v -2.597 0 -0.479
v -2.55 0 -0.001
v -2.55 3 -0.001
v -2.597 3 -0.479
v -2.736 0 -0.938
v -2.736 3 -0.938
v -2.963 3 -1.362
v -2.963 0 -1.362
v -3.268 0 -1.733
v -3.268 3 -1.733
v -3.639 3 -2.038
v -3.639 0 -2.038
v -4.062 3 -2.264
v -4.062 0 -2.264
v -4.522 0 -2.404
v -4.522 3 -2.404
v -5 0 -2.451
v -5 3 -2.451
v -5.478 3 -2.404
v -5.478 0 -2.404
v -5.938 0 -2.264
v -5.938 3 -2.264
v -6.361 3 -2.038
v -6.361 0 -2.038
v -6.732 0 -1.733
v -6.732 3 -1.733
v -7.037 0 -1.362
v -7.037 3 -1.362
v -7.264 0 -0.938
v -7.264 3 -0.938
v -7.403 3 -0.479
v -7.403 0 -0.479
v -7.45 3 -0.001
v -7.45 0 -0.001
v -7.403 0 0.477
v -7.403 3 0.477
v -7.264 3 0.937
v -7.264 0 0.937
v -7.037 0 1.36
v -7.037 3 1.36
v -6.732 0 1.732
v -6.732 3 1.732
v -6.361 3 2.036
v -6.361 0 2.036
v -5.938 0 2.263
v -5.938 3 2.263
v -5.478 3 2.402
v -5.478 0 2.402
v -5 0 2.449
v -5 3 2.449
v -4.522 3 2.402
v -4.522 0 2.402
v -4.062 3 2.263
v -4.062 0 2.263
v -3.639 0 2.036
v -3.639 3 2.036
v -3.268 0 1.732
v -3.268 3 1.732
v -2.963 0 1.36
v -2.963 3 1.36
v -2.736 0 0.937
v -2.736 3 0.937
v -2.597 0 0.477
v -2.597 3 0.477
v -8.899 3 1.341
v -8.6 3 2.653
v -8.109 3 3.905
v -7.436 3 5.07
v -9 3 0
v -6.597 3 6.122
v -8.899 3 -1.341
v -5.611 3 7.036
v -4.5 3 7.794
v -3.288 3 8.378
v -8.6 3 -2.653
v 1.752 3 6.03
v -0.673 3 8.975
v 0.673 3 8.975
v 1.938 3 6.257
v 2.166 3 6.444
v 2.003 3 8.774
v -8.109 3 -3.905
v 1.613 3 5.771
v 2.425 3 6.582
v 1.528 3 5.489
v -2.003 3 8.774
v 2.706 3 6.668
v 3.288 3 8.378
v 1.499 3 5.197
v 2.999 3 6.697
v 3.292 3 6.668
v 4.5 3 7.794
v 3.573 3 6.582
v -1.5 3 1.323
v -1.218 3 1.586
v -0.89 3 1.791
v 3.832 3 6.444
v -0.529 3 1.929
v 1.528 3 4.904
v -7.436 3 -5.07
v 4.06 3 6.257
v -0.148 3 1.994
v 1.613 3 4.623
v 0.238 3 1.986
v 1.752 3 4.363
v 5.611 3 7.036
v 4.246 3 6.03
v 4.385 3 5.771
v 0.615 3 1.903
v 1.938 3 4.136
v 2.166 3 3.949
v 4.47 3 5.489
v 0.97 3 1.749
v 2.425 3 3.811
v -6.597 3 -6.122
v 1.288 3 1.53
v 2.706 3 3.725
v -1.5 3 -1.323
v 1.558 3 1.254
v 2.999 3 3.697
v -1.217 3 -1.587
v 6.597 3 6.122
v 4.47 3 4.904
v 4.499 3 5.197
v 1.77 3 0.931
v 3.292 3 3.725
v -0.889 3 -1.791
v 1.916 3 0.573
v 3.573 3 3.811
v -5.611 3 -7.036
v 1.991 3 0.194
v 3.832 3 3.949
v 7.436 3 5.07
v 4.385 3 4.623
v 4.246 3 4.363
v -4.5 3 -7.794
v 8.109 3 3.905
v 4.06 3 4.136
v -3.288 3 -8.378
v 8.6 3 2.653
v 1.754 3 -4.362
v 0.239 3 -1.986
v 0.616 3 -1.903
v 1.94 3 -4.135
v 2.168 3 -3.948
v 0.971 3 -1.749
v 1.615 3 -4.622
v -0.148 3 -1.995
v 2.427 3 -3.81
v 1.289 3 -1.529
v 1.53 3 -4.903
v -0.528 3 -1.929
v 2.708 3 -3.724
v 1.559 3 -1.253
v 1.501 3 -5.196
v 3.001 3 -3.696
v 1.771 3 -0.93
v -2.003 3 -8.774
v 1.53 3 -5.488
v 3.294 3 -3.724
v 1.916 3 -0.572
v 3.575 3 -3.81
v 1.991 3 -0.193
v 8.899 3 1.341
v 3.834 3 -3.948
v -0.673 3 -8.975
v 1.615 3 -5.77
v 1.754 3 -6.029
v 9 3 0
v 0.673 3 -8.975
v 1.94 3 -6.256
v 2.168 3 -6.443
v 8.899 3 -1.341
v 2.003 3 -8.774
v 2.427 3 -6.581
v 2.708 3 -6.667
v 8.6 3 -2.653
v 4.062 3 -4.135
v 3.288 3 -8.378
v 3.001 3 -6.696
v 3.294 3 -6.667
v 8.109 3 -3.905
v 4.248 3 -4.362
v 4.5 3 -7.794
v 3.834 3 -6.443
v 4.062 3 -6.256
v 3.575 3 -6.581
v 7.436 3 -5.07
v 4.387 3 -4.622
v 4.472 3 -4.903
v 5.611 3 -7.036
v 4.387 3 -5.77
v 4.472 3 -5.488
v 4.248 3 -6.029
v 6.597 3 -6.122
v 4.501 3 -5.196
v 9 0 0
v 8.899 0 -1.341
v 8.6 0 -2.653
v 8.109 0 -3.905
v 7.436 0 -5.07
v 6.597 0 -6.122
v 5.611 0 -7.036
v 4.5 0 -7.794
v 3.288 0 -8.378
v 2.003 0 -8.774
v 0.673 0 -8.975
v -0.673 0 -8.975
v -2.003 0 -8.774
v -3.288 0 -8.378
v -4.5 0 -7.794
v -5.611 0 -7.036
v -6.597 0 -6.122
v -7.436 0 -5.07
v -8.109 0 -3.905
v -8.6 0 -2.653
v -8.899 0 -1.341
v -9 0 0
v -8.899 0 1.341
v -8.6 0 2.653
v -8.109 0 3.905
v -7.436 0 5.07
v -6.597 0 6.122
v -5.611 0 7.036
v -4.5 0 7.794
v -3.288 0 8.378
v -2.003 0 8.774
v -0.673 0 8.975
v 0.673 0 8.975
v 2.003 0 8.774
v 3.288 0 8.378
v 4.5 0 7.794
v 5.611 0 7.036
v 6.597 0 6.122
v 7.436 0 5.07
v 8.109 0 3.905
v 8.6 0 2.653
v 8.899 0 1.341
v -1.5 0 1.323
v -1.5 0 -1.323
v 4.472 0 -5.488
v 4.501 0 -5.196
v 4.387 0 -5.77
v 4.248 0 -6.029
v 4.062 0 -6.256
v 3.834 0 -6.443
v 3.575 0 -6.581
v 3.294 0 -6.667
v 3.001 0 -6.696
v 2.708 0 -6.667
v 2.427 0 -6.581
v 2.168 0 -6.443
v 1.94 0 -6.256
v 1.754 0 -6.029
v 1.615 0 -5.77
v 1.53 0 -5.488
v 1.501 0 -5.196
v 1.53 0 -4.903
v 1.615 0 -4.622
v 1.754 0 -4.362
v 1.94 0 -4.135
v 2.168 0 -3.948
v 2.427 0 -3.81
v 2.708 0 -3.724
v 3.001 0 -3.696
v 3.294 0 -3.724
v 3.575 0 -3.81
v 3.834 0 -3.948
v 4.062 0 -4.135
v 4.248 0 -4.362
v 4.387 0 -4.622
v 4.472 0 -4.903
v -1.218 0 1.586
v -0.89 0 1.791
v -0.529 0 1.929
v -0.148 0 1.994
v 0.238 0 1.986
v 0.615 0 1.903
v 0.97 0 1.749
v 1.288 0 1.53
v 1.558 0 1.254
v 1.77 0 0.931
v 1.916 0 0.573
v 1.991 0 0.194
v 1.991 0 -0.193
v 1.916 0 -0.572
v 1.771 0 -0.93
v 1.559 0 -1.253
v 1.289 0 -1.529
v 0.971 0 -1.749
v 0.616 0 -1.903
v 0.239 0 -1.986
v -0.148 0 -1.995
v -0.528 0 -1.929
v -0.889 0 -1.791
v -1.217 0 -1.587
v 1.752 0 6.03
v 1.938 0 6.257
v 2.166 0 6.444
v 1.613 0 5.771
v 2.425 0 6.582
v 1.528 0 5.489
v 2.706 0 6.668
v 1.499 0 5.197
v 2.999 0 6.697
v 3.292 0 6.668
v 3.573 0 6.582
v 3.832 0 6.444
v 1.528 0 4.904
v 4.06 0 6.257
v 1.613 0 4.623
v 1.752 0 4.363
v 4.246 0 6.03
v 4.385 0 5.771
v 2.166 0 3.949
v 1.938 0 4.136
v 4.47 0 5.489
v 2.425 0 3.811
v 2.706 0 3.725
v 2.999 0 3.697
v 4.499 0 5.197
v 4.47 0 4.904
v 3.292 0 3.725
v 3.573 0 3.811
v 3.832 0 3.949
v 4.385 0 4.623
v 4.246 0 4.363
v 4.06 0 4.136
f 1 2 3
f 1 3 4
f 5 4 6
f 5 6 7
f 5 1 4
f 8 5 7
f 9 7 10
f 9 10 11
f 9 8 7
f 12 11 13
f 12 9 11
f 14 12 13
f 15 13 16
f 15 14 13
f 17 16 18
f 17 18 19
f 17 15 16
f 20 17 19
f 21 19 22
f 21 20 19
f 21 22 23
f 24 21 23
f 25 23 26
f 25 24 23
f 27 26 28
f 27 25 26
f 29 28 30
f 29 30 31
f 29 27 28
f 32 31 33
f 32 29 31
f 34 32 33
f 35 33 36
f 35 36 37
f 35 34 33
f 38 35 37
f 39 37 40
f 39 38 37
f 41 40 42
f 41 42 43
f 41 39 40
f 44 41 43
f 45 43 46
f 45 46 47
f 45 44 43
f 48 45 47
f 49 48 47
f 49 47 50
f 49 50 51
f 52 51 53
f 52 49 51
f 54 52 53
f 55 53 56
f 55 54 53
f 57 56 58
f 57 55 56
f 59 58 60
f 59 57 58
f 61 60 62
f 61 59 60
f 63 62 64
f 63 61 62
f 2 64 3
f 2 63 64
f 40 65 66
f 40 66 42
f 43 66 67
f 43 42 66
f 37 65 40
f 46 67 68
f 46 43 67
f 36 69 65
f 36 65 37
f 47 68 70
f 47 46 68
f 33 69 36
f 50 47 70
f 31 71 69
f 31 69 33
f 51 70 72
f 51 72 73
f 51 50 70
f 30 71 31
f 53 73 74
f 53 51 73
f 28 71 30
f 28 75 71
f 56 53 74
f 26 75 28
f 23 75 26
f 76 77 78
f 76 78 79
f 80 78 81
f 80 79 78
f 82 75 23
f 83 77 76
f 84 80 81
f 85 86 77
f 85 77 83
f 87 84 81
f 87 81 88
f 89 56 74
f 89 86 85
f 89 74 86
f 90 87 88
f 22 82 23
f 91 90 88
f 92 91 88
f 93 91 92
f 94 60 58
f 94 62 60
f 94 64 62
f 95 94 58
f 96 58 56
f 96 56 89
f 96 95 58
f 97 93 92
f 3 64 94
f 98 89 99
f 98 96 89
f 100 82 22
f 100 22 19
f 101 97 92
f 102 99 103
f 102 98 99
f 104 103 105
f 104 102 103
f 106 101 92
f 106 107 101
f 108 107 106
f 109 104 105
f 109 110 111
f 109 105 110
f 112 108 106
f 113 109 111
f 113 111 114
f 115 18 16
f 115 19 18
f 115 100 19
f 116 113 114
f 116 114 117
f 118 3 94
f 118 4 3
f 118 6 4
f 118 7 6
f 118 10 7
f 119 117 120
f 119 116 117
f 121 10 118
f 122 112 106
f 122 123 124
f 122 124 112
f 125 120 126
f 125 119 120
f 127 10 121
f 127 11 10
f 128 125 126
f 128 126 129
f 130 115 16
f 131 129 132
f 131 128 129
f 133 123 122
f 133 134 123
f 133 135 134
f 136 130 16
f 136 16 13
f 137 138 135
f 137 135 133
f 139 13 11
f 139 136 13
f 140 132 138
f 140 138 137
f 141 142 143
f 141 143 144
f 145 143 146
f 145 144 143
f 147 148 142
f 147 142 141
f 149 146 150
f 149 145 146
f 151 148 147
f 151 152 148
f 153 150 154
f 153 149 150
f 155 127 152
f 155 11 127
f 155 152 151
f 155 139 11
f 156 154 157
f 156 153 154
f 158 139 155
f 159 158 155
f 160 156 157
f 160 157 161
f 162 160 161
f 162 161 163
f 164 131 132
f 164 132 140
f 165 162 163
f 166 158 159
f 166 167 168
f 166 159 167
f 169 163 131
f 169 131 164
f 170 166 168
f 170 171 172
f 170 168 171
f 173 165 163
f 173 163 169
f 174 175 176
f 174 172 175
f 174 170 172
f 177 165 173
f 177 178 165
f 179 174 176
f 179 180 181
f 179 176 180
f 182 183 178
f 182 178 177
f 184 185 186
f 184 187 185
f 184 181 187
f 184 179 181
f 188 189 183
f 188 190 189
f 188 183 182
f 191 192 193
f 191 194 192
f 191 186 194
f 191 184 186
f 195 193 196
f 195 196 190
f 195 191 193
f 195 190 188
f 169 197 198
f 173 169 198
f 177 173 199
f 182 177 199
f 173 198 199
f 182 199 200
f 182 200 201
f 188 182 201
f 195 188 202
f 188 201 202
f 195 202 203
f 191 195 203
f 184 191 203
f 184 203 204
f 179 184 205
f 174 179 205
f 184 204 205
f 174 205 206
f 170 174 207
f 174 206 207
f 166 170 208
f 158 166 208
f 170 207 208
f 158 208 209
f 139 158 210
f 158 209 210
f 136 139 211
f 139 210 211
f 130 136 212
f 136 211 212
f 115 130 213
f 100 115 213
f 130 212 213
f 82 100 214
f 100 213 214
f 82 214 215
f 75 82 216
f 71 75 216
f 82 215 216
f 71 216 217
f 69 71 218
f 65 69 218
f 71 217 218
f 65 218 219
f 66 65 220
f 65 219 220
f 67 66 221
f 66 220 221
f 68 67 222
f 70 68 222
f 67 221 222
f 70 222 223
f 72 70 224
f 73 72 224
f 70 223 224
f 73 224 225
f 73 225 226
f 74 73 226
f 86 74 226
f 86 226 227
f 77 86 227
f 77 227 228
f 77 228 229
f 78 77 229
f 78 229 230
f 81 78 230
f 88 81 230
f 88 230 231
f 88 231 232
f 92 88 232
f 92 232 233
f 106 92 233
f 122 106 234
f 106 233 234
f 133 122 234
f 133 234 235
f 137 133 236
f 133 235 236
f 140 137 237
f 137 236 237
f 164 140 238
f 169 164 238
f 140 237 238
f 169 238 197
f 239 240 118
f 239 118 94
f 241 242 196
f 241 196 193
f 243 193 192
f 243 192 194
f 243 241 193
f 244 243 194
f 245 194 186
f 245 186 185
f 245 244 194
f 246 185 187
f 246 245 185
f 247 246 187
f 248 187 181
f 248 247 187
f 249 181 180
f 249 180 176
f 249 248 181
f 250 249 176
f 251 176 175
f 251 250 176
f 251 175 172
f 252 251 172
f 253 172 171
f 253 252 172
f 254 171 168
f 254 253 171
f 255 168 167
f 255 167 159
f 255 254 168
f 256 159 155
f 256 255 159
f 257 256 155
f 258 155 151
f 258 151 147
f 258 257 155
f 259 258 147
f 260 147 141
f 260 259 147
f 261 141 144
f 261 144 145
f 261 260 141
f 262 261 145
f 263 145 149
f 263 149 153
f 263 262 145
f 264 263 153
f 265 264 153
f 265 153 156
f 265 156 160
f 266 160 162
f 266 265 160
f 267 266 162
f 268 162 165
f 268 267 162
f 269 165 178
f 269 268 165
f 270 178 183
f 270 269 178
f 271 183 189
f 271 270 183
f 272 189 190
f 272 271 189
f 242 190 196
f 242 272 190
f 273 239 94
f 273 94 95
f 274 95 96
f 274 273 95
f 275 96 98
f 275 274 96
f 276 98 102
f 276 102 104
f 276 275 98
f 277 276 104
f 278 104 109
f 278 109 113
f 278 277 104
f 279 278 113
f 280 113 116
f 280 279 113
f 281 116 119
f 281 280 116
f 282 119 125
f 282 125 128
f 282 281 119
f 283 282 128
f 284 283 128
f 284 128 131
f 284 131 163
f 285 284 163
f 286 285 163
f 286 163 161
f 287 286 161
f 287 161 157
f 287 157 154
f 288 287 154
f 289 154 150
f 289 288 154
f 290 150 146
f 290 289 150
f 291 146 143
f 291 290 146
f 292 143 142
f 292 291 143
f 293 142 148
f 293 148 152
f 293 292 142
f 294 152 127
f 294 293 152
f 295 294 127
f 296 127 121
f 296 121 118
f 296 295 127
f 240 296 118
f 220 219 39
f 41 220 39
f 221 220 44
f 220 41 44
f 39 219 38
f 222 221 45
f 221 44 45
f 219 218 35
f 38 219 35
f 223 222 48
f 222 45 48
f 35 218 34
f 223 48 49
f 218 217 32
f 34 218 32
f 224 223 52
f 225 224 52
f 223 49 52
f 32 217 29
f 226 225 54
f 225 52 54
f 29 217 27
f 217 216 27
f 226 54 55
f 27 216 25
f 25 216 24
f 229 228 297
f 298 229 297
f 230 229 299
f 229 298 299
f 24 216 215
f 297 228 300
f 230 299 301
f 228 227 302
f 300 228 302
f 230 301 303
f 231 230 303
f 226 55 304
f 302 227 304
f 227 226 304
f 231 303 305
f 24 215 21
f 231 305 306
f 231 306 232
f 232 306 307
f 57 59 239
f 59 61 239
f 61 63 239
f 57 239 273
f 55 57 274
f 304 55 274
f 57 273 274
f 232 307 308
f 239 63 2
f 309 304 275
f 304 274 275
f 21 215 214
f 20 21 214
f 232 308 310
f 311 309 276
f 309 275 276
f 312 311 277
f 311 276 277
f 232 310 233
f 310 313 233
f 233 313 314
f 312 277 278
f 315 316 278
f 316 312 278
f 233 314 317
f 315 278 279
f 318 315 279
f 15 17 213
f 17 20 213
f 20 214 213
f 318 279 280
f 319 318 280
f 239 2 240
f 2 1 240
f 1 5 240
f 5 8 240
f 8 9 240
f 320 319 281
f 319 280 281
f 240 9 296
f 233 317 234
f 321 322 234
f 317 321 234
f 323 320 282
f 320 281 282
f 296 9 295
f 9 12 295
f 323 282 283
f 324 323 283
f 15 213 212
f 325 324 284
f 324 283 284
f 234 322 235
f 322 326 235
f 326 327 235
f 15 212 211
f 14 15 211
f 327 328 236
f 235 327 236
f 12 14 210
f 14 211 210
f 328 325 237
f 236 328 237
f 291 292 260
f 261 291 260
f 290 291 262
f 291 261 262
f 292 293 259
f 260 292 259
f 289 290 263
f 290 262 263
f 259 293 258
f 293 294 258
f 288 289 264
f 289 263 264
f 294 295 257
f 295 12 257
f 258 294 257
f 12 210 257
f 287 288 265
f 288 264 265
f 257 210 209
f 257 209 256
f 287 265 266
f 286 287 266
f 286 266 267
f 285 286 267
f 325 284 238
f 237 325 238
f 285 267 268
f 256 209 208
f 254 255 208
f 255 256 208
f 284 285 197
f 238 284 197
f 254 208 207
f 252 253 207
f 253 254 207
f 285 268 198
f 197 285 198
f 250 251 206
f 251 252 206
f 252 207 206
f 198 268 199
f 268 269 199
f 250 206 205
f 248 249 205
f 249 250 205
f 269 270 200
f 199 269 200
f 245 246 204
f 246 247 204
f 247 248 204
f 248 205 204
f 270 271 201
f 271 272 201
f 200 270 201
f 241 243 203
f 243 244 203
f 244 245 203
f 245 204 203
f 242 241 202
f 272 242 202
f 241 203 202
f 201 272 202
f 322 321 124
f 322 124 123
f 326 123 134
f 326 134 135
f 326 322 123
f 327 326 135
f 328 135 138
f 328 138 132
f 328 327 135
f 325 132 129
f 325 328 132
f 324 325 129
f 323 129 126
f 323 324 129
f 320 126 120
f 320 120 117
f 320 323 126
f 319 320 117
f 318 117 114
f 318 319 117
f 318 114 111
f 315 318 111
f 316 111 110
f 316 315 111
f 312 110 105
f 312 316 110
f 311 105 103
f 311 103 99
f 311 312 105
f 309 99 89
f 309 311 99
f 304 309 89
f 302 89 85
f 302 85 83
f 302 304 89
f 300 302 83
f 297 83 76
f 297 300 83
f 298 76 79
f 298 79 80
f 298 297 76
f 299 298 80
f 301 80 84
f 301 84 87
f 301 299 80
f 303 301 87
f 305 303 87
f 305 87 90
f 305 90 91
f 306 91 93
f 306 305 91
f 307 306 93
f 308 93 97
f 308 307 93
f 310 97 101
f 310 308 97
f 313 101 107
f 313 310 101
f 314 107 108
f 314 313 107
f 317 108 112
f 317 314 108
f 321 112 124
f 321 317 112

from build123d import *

# Parameters (mm, degrees)
SKETCH1_R           = 9
SKETCH1_R_2         = 2.45
SKETCH1_R_3         = 1.5
BOSS_EXTRUDE1_DEPTH = 3


with BuildPart() as part:
    # Sketch1 → Boss-Extrude1 (new body)
    with BuildSketch(Plane(origin=(0, 0, 0), x_dir=(1, 0, 0), z_dir=(0, 1, 0))):
        Circle(SKETCH1_R)
        with Locations((-5, 0.000835232)):
            Circle(SKETCH1_R_2, mode=Mode.SUBTRACT)
        with Locations((2.999131959, -5.19665349)):
            Circle(SKETCH1_R_3, mode=Mode.SUBTRACT)
        with Locations((3.000867957, 5.195651211)):
            Circle(SKETCH1_R_3, mode=Mode.SUBTRACT)
        with BuildLine():
            Line((-1.499778997, 1.323126207), (-1.500220961, -1.322625067))
            ThreePointArc((-1.500220961, -1.322625067), (1.999999972, -0.000334093), (-1.499778997, 1.323126207))
        make_face(mode=Mode.SUBTRACT)
    extrude(amount=BOSS_EXTRUDE1_DEPTH)


solid = part.part
